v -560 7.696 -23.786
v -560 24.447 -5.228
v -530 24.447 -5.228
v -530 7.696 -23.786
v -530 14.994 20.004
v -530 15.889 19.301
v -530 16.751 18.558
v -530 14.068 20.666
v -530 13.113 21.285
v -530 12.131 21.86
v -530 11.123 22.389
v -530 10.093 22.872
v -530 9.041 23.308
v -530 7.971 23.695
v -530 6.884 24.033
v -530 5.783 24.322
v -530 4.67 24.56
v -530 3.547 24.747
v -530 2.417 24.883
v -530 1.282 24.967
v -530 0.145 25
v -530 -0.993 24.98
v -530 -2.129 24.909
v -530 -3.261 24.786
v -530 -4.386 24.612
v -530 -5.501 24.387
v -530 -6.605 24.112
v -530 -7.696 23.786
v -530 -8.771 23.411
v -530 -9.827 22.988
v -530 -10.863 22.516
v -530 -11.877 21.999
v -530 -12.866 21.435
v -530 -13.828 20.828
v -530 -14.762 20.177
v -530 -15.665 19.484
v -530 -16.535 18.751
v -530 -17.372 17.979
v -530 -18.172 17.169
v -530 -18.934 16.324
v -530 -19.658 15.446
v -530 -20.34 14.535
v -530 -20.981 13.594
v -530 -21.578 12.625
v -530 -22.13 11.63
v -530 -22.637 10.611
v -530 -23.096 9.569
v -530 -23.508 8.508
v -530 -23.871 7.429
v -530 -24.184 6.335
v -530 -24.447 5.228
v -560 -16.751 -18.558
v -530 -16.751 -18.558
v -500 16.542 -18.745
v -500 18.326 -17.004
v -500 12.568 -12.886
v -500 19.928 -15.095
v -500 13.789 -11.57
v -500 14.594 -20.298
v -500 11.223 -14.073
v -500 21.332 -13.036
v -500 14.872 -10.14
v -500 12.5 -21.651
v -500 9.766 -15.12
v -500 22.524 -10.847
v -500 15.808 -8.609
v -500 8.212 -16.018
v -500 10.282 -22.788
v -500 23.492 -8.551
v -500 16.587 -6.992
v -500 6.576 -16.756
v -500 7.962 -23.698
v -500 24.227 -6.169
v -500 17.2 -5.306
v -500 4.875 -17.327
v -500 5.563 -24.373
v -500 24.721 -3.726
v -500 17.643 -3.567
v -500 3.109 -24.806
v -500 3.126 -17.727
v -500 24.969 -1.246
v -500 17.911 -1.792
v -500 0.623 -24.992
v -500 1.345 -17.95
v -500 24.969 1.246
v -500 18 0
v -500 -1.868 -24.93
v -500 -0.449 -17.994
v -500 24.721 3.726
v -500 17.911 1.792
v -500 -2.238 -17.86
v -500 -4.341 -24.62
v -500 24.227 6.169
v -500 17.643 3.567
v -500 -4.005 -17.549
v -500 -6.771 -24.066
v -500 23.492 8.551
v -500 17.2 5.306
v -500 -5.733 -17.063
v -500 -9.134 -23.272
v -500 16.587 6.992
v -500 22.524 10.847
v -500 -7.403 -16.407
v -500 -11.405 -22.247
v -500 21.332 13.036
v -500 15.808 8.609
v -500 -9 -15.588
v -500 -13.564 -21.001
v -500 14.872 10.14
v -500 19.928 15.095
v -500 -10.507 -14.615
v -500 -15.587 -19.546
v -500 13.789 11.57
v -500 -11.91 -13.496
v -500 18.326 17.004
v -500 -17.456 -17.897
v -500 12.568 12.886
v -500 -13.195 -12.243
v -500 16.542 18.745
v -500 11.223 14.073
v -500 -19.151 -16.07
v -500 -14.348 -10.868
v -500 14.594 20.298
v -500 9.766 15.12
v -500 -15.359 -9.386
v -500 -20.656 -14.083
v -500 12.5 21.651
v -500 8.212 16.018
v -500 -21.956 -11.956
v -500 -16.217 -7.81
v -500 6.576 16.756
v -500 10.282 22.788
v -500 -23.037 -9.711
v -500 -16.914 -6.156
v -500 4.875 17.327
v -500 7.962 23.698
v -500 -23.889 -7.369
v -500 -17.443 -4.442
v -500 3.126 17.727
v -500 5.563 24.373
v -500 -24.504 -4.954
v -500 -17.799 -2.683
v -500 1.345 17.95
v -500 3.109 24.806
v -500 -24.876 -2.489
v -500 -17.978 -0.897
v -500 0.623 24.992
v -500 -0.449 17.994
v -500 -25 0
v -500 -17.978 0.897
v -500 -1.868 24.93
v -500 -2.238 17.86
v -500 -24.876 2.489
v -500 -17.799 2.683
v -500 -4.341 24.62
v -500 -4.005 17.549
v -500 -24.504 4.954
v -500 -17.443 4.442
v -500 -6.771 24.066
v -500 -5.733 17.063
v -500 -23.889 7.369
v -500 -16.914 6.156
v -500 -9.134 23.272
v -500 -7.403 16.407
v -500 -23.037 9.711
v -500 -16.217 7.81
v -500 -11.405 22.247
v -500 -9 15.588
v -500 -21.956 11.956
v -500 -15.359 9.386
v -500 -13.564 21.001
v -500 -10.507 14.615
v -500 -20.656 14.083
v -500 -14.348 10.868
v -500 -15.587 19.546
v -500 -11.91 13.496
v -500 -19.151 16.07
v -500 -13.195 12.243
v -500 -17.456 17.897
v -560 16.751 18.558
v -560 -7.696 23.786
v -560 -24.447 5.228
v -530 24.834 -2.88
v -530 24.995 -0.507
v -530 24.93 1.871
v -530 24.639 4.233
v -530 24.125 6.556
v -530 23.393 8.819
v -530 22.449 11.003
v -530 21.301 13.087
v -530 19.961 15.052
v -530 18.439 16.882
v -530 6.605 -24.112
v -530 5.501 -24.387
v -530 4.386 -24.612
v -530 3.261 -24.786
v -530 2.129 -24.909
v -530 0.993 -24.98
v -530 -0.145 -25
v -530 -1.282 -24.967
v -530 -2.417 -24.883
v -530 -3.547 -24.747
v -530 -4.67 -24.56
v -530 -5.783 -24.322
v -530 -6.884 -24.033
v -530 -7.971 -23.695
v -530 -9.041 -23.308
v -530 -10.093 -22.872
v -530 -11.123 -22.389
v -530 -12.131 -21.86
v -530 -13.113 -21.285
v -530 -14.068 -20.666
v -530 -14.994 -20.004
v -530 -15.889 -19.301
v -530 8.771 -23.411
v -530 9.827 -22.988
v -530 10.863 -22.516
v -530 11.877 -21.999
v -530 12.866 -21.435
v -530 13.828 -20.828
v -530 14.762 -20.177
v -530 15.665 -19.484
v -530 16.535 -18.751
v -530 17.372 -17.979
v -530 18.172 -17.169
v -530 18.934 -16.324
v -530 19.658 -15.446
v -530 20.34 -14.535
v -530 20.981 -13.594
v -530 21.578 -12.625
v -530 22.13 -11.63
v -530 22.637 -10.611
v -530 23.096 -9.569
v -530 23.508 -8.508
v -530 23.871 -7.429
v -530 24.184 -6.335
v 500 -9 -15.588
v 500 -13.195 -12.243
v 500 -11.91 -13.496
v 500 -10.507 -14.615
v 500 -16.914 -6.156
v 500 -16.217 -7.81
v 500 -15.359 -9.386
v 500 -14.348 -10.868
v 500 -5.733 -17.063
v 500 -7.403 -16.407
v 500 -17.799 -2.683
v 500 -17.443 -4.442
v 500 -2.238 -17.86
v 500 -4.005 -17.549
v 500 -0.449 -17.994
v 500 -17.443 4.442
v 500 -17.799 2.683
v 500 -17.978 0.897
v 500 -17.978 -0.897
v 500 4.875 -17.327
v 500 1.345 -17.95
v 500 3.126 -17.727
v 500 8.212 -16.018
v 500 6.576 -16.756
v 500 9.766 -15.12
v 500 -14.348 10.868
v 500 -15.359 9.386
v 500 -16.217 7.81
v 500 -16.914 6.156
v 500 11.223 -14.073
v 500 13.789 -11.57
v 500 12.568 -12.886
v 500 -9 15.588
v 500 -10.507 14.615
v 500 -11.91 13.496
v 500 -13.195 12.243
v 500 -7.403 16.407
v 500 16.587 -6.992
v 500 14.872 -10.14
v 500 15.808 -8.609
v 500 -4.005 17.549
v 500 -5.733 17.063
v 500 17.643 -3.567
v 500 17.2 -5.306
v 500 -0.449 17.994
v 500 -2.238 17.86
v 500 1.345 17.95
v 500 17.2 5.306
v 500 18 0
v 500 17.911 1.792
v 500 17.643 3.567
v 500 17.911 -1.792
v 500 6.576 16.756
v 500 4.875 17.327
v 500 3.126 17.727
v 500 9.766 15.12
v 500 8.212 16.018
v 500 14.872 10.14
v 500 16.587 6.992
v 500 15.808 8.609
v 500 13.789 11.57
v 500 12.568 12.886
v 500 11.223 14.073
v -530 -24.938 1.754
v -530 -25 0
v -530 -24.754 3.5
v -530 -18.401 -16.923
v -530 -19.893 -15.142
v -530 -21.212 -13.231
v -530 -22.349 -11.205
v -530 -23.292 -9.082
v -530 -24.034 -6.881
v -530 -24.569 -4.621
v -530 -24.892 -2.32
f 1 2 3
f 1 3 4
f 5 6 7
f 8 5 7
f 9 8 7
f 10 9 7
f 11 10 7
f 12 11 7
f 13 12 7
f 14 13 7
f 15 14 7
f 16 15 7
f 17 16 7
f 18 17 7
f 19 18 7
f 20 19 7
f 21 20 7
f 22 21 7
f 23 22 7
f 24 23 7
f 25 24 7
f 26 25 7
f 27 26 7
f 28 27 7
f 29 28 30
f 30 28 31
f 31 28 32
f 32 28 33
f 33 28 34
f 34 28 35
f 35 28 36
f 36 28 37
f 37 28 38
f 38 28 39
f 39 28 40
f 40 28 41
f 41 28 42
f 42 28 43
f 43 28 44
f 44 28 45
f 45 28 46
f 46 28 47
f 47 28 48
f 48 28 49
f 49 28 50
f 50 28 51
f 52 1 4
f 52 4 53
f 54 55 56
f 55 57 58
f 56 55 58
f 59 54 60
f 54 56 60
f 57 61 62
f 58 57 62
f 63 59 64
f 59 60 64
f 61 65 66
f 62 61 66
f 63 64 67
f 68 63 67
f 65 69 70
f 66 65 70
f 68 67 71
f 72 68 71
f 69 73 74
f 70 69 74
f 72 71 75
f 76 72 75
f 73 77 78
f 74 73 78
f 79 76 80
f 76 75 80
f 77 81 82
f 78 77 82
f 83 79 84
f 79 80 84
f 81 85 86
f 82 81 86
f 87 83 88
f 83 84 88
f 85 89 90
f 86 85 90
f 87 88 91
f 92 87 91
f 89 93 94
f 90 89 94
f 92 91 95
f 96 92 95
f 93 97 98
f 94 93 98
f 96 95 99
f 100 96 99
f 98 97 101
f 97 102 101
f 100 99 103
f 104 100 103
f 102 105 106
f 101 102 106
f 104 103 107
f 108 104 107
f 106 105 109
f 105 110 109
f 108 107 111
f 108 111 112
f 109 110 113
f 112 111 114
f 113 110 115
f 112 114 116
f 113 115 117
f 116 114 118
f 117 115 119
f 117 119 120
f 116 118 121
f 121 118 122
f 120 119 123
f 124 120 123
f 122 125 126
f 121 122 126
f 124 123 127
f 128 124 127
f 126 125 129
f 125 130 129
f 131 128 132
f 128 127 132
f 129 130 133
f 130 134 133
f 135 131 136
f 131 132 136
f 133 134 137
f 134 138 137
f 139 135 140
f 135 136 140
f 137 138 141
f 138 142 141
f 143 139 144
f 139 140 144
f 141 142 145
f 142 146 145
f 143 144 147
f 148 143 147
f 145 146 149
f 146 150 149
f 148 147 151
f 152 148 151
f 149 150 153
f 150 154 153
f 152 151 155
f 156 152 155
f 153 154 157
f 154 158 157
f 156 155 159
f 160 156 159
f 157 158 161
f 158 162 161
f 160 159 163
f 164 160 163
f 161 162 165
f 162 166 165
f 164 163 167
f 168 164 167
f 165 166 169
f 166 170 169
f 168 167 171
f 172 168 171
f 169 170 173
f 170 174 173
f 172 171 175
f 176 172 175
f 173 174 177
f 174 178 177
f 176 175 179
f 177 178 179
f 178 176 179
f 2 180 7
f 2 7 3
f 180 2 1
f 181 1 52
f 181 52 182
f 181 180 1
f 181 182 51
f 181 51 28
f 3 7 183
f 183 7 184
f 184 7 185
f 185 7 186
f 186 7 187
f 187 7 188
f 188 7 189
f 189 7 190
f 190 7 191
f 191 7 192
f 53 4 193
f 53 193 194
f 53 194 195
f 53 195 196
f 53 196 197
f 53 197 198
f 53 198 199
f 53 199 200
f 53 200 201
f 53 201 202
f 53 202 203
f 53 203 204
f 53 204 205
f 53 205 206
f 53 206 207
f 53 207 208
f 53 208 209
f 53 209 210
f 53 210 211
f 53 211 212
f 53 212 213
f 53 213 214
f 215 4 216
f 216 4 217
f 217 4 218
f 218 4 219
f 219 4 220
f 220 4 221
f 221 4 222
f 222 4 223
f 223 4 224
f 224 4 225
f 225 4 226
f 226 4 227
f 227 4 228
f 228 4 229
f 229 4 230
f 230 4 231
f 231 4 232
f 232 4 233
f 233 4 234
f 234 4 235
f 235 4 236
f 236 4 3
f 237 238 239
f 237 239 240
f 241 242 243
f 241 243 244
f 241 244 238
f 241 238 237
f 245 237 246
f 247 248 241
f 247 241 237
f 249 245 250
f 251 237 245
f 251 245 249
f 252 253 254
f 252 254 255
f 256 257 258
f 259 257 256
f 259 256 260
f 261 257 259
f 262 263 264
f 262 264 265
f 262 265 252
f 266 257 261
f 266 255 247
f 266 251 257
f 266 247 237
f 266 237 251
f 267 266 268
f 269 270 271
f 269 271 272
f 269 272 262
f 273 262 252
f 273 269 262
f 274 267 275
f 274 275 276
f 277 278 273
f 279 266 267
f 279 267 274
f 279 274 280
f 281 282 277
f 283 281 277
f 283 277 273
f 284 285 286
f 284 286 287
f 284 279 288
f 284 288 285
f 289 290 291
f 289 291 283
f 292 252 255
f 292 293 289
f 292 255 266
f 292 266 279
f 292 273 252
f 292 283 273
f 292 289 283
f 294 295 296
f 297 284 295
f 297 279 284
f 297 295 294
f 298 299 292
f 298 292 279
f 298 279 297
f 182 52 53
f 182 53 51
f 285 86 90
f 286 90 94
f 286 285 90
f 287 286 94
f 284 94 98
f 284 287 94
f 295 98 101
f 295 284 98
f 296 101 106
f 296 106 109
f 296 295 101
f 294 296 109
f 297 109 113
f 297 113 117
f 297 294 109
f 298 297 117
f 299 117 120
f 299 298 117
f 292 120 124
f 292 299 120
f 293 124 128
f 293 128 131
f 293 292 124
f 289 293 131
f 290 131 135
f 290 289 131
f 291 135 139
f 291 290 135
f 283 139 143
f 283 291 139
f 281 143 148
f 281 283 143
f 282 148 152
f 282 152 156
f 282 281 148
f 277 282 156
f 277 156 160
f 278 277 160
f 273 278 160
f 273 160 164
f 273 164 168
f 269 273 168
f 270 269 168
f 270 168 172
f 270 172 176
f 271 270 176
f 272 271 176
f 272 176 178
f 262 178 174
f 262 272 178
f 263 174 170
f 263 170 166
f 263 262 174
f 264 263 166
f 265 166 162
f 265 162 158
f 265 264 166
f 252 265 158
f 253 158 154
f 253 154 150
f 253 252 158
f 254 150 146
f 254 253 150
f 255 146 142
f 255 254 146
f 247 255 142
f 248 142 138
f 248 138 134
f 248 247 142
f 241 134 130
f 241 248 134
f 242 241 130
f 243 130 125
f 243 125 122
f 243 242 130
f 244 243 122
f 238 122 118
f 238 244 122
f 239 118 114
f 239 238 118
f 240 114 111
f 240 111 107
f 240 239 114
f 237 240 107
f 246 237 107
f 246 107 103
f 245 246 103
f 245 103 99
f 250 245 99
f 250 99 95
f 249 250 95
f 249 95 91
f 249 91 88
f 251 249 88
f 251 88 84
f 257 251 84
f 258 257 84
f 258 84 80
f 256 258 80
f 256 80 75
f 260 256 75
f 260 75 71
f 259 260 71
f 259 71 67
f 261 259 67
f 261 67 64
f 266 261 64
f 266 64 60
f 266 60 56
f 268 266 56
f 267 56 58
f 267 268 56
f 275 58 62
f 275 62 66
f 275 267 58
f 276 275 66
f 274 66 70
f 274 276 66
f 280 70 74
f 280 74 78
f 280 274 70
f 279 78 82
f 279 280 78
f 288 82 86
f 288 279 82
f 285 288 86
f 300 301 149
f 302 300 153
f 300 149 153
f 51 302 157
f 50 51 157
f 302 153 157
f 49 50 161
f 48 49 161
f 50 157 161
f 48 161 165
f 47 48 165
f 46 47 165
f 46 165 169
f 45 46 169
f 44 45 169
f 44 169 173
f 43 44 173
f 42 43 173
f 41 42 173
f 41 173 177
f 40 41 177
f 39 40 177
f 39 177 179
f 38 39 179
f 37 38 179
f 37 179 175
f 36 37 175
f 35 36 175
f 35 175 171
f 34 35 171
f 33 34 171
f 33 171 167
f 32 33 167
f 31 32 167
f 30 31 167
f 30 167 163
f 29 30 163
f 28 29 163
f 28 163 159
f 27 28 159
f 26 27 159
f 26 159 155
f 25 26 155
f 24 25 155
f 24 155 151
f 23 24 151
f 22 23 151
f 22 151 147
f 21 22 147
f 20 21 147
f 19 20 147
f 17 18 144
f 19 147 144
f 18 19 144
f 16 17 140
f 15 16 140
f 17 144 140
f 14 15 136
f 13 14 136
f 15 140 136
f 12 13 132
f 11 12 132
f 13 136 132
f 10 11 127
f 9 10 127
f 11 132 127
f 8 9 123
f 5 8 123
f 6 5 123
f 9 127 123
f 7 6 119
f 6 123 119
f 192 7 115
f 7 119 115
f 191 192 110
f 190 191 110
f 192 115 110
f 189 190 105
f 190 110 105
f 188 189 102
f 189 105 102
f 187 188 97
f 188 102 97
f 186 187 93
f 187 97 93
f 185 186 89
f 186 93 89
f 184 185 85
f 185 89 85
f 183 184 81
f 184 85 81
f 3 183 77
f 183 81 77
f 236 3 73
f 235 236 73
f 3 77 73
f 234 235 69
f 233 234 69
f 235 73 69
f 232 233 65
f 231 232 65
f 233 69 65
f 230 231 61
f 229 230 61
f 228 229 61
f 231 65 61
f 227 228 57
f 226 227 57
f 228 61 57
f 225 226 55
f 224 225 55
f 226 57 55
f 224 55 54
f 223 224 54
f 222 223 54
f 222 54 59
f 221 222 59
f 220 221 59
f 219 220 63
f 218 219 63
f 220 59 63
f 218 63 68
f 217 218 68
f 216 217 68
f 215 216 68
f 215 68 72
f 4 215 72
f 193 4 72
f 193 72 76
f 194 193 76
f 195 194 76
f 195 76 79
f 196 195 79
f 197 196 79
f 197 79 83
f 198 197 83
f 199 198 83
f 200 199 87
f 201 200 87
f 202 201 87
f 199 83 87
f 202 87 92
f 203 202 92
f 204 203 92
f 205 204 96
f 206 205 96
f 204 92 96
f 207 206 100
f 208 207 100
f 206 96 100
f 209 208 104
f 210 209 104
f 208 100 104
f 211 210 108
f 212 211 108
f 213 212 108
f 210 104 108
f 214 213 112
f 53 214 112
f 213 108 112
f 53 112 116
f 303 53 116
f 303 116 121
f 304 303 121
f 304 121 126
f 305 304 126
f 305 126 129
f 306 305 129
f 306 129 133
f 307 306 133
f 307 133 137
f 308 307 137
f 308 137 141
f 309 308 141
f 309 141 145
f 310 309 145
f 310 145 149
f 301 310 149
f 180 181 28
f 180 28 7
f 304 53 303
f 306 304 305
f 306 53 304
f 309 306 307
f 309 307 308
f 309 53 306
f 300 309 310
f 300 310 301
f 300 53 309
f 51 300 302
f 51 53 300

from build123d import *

# Parameters (mm, degrees)
F0_R     = 18
F1_DEPTH = 500
F2_R     = 25
F3_DEPTH = 30
F5_DEPTH = 30


with BuildPart() as f1:
    # F0 (on Right) → F1 (new body, symmetric)
    with BuildSketch(Plane.YZ):
        Circle(F0_R)
    extrude(amount=F1_DEPTH, both=True)

    # F2 (on face) → F3 (join)
    with BuildSketch(Plane(origin=(-500, 0, 0), x_dir=(0, -1, 0), z_dir=(-1, 0, 0))):
        Circle(F2_R)
    extrude(amount=F3_DEPTH)

    # F4 (on face) → F5 (join)
    with BuildSketch(Plane(origin=(-530, 0, 0), x_dir=(0, -1, 0), z_dir=(-1, 0, 0))):
        Polygon((-7.696053, -23.785936), (16.751199, -18.557945), (24.447252, 5.227991), (7.696053, 23.785936), (-16.751199, 18.557945), (-24.447252, -5.227991), align=None)
    extrude(amount=F5_DEPTH)


solid = f1.part
